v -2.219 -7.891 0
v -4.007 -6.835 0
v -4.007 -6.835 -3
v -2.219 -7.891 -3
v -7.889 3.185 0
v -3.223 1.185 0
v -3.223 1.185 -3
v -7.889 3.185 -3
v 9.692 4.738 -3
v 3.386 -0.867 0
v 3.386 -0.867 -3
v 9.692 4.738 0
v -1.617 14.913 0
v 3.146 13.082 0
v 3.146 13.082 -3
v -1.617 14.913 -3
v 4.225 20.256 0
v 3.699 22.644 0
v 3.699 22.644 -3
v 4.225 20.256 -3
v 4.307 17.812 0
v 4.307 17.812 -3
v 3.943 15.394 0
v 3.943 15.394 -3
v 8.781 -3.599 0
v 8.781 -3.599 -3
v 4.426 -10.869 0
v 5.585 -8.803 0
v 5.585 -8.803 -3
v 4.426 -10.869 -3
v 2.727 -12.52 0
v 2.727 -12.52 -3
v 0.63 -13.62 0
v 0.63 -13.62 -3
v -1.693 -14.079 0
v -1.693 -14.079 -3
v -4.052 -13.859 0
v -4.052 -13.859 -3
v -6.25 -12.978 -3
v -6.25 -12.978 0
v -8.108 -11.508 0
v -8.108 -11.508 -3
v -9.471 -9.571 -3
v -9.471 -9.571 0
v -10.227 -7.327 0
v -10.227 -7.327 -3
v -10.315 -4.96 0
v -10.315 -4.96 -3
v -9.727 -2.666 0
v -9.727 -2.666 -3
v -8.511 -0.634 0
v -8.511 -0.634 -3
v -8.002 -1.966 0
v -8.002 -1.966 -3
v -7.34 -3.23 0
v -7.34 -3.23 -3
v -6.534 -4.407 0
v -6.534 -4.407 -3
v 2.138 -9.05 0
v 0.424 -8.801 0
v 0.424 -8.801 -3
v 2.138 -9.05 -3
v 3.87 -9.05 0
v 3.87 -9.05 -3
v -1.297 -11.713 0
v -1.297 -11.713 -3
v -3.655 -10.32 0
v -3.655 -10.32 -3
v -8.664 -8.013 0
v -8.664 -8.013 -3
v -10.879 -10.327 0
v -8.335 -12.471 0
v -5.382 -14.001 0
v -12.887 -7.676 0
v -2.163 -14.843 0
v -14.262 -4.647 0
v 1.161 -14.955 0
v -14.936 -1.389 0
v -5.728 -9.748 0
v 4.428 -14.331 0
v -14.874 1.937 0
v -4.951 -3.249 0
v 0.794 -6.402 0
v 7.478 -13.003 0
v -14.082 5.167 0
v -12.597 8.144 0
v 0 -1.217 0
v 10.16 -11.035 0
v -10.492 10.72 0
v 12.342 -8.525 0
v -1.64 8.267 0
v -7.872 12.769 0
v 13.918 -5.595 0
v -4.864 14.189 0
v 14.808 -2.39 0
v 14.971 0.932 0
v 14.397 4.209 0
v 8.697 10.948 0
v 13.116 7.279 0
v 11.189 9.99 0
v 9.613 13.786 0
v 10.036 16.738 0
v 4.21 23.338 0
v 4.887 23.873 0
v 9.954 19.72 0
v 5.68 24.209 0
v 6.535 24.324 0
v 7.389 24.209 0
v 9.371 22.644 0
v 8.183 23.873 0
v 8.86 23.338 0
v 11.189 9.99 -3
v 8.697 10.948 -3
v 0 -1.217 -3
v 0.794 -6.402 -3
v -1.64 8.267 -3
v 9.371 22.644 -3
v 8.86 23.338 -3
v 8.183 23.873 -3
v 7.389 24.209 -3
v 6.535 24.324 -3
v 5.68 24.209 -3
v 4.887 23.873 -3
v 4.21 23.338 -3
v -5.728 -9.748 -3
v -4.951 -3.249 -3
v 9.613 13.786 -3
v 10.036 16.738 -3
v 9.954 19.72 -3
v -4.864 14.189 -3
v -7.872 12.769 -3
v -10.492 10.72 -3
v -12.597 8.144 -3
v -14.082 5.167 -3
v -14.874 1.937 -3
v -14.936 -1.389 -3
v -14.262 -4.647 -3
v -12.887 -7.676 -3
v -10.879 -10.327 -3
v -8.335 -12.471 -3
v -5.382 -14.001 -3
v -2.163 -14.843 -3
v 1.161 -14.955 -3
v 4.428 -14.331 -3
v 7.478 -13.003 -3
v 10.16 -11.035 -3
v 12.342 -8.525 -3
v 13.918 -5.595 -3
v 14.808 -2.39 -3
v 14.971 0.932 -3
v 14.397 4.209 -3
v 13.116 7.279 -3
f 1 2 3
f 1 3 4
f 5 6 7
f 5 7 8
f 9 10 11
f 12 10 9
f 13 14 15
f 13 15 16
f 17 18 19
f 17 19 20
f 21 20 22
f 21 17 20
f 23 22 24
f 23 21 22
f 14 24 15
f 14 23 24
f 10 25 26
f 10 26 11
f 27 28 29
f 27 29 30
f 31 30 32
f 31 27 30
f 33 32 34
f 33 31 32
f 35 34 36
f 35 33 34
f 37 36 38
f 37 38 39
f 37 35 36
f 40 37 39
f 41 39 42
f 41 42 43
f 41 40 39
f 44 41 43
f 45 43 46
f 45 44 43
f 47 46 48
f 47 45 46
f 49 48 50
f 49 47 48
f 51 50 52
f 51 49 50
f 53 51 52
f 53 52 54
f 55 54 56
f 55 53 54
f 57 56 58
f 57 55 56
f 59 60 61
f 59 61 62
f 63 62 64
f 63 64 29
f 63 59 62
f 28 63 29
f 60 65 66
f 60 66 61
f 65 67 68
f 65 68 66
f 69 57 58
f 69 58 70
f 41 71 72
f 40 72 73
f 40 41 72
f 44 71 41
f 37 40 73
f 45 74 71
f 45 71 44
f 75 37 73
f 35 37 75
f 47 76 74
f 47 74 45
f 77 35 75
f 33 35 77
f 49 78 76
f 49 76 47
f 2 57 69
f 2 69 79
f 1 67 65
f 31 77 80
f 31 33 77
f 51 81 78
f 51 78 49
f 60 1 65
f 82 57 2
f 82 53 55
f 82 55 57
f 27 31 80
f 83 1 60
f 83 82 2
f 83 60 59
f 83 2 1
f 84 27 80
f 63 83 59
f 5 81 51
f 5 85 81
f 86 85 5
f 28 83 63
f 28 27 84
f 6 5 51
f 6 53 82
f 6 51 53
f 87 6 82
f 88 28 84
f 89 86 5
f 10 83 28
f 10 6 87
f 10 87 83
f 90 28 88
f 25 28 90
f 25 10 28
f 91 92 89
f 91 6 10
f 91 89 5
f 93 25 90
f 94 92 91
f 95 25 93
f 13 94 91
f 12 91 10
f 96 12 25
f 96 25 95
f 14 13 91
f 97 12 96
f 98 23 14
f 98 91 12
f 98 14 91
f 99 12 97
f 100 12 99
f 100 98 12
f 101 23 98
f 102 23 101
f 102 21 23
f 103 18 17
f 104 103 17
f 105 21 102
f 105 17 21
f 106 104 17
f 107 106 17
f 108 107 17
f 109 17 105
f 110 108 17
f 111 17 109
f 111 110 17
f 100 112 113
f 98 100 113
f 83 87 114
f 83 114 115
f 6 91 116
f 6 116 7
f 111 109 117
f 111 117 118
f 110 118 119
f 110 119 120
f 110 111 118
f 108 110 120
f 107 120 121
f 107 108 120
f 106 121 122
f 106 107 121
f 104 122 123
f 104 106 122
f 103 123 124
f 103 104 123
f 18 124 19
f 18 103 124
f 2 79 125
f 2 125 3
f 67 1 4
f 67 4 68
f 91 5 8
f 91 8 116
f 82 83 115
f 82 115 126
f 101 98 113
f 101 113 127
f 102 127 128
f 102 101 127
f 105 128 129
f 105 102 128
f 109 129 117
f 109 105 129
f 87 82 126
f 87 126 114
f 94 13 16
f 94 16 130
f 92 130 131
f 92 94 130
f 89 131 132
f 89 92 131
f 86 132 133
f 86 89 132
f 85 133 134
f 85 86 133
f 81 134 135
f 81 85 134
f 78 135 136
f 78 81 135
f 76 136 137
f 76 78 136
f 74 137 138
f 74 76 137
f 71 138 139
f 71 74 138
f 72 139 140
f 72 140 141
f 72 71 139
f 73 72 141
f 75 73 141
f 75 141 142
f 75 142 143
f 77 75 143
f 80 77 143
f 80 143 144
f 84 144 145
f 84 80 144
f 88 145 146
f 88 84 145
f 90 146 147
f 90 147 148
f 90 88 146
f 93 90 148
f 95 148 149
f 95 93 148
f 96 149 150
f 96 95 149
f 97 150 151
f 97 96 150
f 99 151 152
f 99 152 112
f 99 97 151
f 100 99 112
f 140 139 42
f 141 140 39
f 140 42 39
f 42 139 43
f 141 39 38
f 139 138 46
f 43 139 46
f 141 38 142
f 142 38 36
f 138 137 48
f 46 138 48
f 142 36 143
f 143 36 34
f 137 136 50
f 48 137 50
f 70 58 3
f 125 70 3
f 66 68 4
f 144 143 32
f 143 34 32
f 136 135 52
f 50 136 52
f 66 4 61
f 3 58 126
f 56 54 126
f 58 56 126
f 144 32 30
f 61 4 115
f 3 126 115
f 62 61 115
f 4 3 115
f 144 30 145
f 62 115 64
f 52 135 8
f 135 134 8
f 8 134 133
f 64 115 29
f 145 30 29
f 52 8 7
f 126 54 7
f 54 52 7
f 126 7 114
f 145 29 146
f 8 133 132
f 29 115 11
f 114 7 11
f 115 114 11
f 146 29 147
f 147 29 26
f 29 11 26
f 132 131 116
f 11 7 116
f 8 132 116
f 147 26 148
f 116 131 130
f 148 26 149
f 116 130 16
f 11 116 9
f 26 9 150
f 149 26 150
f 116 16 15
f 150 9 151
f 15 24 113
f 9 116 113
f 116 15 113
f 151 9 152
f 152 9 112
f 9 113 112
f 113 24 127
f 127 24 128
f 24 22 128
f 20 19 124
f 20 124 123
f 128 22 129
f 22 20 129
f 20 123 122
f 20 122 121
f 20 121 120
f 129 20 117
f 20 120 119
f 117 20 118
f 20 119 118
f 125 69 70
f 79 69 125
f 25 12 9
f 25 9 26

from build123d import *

# Parameters (mm, degrees)
F1_DEPTH = 3


with BuildPart() as f1:
    # F0 (on Top) → F1 (new body)
    with BuildSketch(Plane.XY):
        with BuildLine():
            Line((3.145587, 13.081894), (-1.617252, 14.912562))
            ThreePointArc((-1.617252, 14.912562), (-5.38163, -14.001359), (11.189027, 9.990279))
            Line((11.189027, 9.990279), (8.696999, 10.948126))
            ThreePointArc((8.696999, 10.948126), (10.035784, 16.738453), (9.370891, 22.644226))
            ThreePointArc((9.370891, 22.644226), (6.534897, 24.324435), (3.698903, 22.644226))
            ThreePointArc((3.698903, 22.644226), (4.30714, 17.811856), (3.145587, 13.081894))
        make_face()
        with BuildLine():
            ThreePointArc((5.58474, -8.803174), (-6.250082, -12.977674), (-8.510819, -0.633504))
            ThreePointArc((-8.510819, -0.633504), (-7.689946, -2.608119), (-6.533715, -4.407026))
            Line((-6.533715, -4.407026), (-8.664479, -8.012936))
            Line((-8.664479, -8.012936), (-5.728126, -9.748053))
            Line((-5.728126, -9.748053), (-4.006592, -6.834687))
            Line((-4.006592, -6.834687), (-2.219331, -7.890795))
            Line((-2.219331, -7.890795), (-3.654934, -10.320276))
            Line((-3.654934, -10.320276), (-1.297309, -11.713418))
            Line((-1.297309, -11.713418), (0.423625, -8.801069))
            ThreePointArc((0.423625, -8.801069), (3.004069, -9.081008), (5.58474, -8.803174))
        make_face(mode=Mode.SUBTRACT)
        Polygon((0.793802, -6.401524), (-4.951228, -3.248764), (0, -1.216984), align=None, mode=Mode.SUBTRACT)
        Polygon((8.780796, -3.59907), (3.386073, -0.866678), (9.691594, 4.73823), align=None, mode=Mode.SUBTRACT)
        Polygon((-3.222847, 1.18529), (-7.888624, 3.184909), (-1.639816, 8.267273), align=None, mode=Mode.SUBTRACT)
    extrude(amount=-F1_DEPTH)


solid = f1.part
